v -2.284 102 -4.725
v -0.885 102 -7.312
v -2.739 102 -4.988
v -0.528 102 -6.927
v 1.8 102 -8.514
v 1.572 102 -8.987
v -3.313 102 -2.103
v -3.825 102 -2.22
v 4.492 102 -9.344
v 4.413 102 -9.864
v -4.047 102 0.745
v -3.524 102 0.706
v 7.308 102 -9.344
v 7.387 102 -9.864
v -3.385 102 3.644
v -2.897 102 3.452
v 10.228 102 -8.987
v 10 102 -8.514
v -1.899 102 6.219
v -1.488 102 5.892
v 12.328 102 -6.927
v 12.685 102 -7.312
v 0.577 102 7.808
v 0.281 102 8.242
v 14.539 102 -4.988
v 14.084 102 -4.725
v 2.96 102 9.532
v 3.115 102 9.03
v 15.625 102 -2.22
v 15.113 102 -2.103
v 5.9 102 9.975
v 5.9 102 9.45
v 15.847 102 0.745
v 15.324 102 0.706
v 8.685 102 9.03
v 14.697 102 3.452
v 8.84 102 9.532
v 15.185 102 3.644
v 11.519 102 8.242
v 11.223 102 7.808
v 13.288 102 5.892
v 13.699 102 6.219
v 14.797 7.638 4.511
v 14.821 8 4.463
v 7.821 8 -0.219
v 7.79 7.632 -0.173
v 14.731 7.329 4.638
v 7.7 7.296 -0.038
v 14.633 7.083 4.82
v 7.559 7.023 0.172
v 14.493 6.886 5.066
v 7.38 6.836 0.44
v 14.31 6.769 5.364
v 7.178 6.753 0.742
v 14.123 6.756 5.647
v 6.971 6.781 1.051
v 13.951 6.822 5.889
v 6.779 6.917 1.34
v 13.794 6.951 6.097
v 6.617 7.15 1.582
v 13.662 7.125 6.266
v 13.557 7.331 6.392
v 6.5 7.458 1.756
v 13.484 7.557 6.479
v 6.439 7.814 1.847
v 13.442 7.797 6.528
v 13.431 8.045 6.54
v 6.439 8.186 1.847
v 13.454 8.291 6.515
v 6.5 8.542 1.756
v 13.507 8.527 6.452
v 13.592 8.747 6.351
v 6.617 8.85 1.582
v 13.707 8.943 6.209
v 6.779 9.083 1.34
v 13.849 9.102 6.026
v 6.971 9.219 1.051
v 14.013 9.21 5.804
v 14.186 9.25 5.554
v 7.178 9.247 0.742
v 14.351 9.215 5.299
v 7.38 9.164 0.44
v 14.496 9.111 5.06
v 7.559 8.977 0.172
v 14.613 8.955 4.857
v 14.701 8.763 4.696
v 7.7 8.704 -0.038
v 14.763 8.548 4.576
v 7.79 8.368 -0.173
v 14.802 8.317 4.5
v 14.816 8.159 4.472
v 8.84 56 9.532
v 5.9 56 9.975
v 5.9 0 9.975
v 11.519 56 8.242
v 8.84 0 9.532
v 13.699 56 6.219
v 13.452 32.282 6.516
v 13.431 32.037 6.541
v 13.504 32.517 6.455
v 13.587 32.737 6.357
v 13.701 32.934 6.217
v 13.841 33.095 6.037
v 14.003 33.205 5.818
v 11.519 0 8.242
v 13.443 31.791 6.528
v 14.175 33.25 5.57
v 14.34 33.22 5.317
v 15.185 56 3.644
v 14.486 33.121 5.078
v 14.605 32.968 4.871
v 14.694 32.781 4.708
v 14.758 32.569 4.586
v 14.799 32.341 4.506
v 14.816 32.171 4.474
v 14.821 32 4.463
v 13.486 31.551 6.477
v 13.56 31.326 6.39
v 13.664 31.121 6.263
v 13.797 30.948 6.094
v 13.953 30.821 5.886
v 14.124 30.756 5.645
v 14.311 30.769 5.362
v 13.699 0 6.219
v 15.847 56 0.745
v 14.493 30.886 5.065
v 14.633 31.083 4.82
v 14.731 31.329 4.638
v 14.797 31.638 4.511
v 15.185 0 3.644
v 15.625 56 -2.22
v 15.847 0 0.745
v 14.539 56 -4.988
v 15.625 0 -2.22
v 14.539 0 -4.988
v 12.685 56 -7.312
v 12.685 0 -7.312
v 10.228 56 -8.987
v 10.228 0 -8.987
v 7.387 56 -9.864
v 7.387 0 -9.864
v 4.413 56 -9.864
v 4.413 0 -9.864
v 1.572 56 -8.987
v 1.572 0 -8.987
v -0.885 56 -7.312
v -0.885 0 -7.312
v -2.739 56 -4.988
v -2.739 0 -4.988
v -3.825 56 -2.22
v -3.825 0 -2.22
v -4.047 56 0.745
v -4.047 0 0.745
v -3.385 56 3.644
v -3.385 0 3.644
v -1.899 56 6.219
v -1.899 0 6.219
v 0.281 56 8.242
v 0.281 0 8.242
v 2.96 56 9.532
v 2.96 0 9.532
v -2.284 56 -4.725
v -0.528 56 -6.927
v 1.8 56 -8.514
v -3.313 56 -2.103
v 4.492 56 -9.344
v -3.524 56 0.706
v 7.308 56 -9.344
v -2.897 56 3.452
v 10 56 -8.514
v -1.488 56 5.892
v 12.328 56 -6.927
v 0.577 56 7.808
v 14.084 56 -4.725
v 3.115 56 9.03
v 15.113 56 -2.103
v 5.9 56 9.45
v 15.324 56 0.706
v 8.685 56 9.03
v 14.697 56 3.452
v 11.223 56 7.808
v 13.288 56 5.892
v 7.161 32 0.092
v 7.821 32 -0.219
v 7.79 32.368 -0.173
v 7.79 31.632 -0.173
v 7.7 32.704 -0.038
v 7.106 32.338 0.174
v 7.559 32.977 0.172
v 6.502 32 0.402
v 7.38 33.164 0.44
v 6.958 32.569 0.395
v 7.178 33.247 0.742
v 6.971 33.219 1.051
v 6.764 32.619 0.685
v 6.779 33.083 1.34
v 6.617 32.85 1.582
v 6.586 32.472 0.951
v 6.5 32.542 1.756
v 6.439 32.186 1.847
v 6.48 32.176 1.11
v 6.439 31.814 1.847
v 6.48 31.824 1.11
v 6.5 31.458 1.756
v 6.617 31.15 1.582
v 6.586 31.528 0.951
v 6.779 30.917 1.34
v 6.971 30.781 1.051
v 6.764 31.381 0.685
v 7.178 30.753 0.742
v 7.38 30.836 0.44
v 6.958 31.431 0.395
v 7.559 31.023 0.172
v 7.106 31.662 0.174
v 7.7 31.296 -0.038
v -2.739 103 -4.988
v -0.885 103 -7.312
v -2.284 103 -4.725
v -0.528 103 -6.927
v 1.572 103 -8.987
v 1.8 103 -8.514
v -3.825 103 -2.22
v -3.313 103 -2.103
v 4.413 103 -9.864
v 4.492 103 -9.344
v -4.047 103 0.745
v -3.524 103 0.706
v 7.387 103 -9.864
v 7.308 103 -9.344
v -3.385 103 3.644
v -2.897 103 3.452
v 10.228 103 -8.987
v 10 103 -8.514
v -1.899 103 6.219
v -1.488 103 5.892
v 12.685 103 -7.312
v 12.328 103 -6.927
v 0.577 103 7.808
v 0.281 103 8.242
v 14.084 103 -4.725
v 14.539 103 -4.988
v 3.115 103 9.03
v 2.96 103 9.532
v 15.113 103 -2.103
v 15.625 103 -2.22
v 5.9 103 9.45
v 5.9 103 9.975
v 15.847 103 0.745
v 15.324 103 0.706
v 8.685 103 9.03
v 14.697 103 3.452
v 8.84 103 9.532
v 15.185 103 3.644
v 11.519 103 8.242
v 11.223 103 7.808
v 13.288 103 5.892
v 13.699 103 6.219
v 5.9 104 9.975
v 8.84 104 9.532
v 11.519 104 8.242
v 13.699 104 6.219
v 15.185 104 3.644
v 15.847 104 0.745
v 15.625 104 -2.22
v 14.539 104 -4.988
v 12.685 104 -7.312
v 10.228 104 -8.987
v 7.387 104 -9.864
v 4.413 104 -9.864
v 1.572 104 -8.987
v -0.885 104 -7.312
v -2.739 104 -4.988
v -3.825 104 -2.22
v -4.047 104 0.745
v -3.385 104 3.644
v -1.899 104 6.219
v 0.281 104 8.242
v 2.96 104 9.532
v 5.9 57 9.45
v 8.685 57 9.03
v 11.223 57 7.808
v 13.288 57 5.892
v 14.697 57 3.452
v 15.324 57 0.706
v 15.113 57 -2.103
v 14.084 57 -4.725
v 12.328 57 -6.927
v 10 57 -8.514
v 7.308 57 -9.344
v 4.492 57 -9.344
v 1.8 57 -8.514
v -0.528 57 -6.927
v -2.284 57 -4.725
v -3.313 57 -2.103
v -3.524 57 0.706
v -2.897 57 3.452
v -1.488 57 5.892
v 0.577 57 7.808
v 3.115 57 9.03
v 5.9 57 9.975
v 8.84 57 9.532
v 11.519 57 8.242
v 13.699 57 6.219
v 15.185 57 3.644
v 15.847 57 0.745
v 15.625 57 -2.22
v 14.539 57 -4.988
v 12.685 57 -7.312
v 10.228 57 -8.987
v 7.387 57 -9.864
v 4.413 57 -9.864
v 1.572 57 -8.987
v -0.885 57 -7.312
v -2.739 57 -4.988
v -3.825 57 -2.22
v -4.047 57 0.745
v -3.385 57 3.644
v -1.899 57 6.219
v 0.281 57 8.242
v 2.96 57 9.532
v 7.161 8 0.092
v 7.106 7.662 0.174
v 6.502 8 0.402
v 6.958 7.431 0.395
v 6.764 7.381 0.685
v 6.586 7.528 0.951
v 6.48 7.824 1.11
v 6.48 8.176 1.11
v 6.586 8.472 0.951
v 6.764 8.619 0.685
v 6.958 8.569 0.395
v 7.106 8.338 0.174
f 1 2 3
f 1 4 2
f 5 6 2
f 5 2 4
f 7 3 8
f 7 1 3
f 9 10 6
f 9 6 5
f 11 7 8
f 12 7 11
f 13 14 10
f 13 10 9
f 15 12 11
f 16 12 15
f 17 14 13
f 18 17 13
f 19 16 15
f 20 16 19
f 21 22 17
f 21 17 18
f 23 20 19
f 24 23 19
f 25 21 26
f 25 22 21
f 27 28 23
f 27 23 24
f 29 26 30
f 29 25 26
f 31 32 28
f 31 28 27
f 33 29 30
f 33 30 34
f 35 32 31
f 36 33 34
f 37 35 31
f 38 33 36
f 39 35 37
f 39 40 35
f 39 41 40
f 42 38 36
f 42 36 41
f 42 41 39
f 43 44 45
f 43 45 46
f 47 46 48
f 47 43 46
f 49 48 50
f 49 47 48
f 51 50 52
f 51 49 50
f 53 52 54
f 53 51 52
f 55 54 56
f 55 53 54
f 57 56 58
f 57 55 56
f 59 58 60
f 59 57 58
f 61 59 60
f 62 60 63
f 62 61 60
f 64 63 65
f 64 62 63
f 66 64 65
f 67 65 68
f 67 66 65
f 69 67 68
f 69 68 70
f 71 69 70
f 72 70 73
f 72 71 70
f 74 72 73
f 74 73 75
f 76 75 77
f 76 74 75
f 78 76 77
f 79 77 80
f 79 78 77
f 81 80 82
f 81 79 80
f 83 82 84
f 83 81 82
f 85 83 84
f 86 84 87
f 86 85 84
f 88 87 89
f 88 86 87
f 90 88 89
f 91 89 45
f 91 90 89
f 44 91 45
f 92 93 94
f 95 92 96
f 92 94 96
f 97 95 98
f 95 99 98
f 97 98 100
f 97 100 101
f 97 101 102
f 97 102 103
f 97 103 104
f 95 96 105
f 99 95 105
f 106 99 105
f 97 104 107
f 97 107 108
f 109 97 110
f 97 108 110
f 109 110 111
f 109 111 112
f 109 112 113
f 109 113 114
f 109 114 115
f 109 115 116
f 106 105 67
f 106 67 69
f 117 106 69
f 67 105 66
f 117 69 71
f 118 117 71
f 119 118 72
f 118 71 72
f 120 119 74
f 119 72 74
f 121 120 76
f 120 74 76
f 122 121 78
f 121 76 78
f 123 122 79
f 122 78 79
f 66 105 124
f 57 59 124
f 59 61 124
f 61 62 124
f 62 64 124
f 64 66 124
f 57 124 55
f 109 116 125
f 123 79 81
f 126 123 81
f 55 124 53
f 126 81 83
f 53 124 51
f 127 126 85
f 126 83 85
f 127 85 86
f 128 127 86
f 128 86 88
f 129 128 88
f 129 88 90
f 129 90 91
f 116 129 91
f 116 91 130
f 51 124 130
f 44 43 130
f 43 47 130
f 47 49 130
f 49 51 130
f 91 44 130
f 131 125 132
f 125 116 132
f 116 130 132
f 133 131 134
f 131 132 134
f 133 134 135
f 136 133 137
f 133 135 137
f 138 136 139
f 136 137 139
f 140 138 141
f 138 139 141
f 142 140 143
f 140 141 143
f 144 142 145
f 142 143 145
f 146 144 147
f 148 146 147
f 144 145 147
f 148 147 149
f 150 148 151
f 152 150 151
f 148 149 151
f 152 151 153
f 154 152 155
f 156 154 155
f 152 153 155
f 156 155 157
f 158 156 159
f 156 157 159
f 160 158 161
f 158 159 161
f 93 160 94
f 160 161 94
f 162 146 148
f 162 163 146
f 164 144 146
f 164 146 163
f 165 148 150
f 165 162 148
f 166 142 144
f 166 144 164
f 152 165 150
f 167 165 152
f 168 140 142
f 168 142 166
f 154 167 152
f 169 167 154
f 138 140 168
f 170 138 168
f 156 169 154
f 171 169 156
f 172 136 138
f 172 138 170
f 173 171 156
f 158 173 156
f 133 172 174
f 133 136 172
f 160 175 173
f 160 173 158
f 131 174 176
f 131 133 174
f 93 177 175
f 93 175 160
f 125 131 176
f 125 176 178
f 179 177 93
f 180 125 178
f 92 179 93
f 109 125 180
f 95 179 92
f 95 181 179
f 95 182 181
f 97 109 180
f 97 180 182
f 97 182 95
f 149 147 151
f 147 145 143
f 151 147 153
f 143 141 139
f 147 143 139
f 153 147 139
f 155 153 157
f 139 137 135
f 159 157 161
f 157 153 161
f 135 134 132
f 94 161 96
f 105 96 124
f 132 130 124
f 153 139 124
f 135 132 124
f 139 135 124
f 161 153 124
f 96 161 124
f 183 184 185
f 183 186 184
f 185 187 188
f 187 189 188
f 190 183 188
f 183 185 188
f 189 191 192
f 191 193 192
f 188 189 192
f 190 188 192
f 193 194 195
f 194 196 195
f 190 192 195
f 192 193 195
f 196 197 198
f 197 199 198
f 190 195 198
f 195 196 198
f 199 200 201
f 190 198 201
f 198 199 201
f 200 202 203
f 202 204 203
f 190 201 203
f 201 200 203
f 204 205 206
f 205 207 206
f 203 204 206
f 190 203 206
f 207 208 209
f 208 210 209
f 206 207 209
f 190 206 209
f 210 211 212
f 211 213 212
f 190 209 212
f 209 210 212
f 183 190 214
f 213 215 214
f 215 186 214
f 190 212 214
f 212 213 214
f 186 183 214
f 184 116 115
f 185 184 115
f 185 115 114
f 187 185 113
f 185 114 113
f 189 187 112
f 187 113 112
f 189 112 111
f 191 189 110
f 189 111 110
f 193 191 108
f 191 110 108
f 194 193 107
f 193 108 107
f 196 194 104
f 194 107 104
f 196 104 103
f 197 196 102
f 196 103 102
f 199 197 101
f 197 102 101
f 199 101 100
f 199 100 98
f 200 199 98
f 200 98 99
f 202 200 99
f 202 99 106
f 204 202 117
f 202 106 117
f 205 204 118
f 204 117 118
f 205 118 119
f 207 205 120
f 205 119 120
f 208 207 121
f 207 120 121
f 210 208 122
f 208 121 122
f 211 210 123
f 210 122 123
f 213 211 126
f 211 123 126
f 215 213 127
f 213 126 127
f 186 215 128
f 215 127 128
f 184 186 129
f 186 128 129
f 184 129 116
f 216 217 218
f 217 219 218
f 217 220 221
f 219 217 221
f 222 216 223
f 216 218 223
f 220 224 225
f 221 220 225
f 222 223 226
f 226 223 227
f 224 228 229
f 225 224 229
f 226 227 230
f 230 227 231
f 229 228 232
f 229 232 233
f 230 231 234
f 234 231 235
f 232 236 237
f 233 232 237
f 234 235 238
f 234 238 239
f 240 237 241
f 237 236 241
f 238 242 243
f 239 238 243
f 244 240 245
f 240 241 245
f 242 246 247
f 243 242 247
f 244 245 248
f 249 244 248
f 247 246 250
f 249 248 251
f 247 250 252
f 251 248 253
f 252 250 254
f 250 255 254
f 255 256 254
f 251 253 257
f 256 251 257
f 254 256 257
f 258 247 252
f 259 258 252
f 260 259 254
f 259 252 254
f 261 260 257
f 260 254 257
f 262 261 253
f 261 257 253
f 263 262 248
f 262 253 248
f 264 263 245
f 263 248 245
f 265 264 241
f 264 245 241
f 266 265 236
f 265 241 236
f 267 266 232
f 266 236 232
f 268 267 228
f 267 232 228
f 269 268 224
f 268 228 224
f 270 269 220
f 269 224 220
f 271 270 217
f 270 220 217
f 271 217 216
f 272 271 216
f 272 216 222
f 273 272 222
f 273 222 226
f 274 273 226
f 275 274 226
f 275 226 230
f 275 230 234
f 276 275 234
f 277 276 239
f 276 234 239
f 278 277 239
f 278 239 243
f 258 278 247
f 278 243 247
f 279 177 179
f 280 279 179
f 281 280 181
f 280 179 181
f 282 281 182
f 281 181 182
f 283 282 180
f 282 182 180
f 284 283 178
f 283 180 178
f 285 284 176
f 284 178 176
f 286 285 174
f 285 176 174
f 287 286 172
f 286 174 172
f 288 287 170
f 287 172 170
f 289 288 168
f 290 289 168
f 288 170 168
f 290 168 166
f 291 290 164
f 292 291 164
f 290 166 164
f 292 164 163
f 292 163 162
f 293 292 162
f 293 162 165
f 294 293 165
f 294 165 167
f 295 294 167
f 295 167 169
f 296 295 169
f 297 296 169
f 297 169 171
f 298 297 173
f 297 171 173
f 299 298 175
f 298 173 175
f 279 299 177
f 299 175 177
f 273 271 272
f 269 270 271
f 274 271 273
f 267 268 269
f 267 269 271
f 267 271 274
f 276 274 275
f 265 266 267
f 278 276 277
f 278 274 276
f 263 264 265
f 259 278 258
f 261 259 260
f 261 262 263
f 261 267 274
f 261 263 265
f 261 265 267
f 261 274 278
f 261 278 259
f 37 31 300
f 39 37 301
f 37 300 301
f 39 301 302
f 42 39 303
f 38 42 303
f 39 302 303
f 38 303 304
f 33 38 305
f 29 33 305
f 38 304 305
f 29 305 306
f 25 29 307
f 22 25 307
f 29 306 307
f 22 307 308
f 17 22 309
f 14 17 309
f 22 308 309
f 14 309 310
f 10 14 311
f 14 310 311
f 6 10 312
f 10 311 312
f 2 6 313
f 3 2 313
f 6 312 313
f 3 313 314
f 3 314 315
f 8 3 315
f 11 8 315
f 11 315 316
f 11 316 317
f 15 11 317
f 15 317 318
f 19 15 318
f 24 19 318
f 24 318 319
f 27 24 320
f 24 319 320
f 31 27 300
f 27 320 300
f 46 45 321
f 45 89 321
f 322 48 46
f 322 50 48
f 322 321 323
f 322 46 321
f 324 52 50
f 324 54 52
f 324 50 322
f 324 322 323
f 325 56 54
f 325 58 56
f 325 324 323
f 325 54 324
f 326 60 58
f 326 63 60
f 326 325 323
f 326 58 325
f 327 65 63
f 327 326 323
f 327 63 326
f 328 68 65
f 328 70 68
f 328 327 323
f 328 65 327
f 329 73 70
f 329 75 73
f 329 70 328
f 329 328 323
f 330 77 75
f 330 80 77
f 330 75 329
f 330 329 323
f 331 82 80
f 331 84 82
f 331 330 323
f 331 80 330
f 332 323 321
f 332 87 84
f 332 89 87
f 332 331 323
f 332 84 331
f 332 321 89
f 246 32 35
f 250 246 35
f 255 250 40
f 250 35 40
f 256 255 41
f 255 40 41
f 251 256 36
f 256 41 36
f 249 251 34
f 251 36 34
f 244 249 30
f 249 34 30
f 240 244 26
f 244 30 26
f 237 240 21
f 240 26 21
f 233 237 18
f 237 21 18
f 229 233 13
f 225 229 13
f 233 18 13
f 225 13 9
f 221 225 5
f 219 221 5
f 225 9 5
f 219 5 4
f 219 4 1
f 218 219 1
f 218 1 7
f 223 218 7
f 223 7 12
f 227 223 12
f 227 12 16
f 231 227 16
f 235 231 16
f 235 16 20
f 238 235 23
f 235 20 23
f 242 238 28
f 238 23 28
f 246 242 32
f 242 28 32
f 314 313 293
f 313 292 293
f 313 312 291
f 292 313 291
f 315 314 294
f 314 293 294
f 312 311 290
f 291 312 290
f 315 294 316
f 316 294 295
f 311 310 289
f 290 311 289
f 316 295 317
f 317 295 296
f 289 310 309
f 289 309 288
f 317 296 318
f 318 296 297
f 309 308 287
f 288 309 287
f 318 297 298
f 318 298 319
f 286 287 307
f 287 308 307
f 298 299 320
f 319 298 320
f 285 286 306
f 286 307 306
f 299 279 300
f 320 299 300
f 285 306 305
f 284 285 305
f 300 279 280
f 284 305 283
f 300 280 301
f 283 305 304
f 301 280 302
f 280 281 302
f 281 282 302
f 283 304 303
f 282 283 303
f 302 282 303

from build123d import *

# Parameters (mm, degrees)
SKETCH_1_R        = 9.975
EXTRUDE_1_DEPTH   = 40
SKETCH_5_R        = 9.975
F_16MM_DEPTH      = 16
SKETCH_6_R        = 9.45
EXTRUDE_1_2_DEPTH = 1
SKETCH_7_R        = 9.975
EXTRUDE_4_DEPTH   = 45
SKETCH_8_R        = 9.45
EXTRUDE_2_DEPTH   = 1
SKETCH_9_R        = 9.975
EXTRUDE_6_DEPTH   = 1


with BuildPart() as part:
    # 草图1 → Extrude 1 (new body)
    with BuildSketch(Plane(origin=(0, 0, 0), x_dir=(1, 0, 0), z_dir=(0, 1, 0))):
        with Locations(Location((5.9, 0, 0), (0, 0, 270))):
            Circle(SKETCH_1_R)
    extrude(amount=EXTRUDE_1_DEPTH)

    # 草图4 → M3 螺纹孔2 (revolve, cut)
    with BuildSketch(Plane(origin=(14.191283323, 8, 5.545741236), x_dir=(0.555964033642643, 0, -0.8312063482047055), z_dir=(0, 1, 0))):
        Polygon((0, 0), (0, 9.251075774), (1.25, 8.5), (1.25, 0), align=None)
    hole_wizard_m3_2 = revolve(axis=Axis((19.469443634, 8, 9.076112849), (-0.8312063482047054, 0, -0.555964033642643)), mode=Mode.SUBTRACT)

    # Mirror 1364: M3 螺纹孔2 across plane
    add(hole_wizard_m3_2.mirror(Plane(origin=(0, 20, 0), x_dir=(0, 0, 1), z_dir=(0, -1, 0))), mode=Mode.SUBTRACT)

    # 草图5 → 16mm 铰链间距 (add)
    with BuildSketch(Plane(origin=(0, 40, 0), x_dir=(1, 0, 0), z_dir=(0, 1, 0))):
        with Locations(Location((5.9, 0, 0), (0, 0, 270))):
            Circle(SKETCH_5_R)
    extrude(amount=F_16MM_DEPTH)

    # 草图6 → Extrude 1 2 (add)
    with BuildSketch(Plane(origin=(0, 56, 0), x_dir=(1, 0, 0), z_dir=(0, 1, 0))):
        with Locations(Location((5.9, 0, 0), (0, 0, 270))):
            Circle(SKETCH_6_R)
    extrude(amount=EXTRUDE_1_2_DEPTH)

    # 草图7 → 凸台-拉伸4 (add)
    with BuildSketch(Plane(origin=(0, 57, 0), x_dir=(1, 0, 0), z_dir=(0, 1, 0))):
        with Locations(Location((5.9, 0, 0), (0, 0, 270))):
            Circle(SKETCH_7_R)
    extrude(amount=EXTRUDE_4_DEPTH)

    # 草图8 → 卡簧2 (add)
    with BuildSketch(Plane(origin=(0, 102, 0), x_dir=(1, 0, 0), z_dir=(0, 1, 0))):
        with Locations(Location((5.9, 0, 0), (0, 0, 270))):
            Circle(SKETCH_8_R)
    extrude(amount=EXTRUDE_2_DEPTH)

    # 草图9 → 凸台-拉伸6 (add)
    with BuildSketch(Plane(origin=(0, 103, 0), x_dir=(1, 0, 0), z_dir=(0, 1, 0))):
        with Locations(Location((5.9, 0, 0), (0, 0, 270))):
            Circle(SKETCH_9_R)
    extrude(amount=EXTRUDE_6_DEPTH)


solid = part.part
